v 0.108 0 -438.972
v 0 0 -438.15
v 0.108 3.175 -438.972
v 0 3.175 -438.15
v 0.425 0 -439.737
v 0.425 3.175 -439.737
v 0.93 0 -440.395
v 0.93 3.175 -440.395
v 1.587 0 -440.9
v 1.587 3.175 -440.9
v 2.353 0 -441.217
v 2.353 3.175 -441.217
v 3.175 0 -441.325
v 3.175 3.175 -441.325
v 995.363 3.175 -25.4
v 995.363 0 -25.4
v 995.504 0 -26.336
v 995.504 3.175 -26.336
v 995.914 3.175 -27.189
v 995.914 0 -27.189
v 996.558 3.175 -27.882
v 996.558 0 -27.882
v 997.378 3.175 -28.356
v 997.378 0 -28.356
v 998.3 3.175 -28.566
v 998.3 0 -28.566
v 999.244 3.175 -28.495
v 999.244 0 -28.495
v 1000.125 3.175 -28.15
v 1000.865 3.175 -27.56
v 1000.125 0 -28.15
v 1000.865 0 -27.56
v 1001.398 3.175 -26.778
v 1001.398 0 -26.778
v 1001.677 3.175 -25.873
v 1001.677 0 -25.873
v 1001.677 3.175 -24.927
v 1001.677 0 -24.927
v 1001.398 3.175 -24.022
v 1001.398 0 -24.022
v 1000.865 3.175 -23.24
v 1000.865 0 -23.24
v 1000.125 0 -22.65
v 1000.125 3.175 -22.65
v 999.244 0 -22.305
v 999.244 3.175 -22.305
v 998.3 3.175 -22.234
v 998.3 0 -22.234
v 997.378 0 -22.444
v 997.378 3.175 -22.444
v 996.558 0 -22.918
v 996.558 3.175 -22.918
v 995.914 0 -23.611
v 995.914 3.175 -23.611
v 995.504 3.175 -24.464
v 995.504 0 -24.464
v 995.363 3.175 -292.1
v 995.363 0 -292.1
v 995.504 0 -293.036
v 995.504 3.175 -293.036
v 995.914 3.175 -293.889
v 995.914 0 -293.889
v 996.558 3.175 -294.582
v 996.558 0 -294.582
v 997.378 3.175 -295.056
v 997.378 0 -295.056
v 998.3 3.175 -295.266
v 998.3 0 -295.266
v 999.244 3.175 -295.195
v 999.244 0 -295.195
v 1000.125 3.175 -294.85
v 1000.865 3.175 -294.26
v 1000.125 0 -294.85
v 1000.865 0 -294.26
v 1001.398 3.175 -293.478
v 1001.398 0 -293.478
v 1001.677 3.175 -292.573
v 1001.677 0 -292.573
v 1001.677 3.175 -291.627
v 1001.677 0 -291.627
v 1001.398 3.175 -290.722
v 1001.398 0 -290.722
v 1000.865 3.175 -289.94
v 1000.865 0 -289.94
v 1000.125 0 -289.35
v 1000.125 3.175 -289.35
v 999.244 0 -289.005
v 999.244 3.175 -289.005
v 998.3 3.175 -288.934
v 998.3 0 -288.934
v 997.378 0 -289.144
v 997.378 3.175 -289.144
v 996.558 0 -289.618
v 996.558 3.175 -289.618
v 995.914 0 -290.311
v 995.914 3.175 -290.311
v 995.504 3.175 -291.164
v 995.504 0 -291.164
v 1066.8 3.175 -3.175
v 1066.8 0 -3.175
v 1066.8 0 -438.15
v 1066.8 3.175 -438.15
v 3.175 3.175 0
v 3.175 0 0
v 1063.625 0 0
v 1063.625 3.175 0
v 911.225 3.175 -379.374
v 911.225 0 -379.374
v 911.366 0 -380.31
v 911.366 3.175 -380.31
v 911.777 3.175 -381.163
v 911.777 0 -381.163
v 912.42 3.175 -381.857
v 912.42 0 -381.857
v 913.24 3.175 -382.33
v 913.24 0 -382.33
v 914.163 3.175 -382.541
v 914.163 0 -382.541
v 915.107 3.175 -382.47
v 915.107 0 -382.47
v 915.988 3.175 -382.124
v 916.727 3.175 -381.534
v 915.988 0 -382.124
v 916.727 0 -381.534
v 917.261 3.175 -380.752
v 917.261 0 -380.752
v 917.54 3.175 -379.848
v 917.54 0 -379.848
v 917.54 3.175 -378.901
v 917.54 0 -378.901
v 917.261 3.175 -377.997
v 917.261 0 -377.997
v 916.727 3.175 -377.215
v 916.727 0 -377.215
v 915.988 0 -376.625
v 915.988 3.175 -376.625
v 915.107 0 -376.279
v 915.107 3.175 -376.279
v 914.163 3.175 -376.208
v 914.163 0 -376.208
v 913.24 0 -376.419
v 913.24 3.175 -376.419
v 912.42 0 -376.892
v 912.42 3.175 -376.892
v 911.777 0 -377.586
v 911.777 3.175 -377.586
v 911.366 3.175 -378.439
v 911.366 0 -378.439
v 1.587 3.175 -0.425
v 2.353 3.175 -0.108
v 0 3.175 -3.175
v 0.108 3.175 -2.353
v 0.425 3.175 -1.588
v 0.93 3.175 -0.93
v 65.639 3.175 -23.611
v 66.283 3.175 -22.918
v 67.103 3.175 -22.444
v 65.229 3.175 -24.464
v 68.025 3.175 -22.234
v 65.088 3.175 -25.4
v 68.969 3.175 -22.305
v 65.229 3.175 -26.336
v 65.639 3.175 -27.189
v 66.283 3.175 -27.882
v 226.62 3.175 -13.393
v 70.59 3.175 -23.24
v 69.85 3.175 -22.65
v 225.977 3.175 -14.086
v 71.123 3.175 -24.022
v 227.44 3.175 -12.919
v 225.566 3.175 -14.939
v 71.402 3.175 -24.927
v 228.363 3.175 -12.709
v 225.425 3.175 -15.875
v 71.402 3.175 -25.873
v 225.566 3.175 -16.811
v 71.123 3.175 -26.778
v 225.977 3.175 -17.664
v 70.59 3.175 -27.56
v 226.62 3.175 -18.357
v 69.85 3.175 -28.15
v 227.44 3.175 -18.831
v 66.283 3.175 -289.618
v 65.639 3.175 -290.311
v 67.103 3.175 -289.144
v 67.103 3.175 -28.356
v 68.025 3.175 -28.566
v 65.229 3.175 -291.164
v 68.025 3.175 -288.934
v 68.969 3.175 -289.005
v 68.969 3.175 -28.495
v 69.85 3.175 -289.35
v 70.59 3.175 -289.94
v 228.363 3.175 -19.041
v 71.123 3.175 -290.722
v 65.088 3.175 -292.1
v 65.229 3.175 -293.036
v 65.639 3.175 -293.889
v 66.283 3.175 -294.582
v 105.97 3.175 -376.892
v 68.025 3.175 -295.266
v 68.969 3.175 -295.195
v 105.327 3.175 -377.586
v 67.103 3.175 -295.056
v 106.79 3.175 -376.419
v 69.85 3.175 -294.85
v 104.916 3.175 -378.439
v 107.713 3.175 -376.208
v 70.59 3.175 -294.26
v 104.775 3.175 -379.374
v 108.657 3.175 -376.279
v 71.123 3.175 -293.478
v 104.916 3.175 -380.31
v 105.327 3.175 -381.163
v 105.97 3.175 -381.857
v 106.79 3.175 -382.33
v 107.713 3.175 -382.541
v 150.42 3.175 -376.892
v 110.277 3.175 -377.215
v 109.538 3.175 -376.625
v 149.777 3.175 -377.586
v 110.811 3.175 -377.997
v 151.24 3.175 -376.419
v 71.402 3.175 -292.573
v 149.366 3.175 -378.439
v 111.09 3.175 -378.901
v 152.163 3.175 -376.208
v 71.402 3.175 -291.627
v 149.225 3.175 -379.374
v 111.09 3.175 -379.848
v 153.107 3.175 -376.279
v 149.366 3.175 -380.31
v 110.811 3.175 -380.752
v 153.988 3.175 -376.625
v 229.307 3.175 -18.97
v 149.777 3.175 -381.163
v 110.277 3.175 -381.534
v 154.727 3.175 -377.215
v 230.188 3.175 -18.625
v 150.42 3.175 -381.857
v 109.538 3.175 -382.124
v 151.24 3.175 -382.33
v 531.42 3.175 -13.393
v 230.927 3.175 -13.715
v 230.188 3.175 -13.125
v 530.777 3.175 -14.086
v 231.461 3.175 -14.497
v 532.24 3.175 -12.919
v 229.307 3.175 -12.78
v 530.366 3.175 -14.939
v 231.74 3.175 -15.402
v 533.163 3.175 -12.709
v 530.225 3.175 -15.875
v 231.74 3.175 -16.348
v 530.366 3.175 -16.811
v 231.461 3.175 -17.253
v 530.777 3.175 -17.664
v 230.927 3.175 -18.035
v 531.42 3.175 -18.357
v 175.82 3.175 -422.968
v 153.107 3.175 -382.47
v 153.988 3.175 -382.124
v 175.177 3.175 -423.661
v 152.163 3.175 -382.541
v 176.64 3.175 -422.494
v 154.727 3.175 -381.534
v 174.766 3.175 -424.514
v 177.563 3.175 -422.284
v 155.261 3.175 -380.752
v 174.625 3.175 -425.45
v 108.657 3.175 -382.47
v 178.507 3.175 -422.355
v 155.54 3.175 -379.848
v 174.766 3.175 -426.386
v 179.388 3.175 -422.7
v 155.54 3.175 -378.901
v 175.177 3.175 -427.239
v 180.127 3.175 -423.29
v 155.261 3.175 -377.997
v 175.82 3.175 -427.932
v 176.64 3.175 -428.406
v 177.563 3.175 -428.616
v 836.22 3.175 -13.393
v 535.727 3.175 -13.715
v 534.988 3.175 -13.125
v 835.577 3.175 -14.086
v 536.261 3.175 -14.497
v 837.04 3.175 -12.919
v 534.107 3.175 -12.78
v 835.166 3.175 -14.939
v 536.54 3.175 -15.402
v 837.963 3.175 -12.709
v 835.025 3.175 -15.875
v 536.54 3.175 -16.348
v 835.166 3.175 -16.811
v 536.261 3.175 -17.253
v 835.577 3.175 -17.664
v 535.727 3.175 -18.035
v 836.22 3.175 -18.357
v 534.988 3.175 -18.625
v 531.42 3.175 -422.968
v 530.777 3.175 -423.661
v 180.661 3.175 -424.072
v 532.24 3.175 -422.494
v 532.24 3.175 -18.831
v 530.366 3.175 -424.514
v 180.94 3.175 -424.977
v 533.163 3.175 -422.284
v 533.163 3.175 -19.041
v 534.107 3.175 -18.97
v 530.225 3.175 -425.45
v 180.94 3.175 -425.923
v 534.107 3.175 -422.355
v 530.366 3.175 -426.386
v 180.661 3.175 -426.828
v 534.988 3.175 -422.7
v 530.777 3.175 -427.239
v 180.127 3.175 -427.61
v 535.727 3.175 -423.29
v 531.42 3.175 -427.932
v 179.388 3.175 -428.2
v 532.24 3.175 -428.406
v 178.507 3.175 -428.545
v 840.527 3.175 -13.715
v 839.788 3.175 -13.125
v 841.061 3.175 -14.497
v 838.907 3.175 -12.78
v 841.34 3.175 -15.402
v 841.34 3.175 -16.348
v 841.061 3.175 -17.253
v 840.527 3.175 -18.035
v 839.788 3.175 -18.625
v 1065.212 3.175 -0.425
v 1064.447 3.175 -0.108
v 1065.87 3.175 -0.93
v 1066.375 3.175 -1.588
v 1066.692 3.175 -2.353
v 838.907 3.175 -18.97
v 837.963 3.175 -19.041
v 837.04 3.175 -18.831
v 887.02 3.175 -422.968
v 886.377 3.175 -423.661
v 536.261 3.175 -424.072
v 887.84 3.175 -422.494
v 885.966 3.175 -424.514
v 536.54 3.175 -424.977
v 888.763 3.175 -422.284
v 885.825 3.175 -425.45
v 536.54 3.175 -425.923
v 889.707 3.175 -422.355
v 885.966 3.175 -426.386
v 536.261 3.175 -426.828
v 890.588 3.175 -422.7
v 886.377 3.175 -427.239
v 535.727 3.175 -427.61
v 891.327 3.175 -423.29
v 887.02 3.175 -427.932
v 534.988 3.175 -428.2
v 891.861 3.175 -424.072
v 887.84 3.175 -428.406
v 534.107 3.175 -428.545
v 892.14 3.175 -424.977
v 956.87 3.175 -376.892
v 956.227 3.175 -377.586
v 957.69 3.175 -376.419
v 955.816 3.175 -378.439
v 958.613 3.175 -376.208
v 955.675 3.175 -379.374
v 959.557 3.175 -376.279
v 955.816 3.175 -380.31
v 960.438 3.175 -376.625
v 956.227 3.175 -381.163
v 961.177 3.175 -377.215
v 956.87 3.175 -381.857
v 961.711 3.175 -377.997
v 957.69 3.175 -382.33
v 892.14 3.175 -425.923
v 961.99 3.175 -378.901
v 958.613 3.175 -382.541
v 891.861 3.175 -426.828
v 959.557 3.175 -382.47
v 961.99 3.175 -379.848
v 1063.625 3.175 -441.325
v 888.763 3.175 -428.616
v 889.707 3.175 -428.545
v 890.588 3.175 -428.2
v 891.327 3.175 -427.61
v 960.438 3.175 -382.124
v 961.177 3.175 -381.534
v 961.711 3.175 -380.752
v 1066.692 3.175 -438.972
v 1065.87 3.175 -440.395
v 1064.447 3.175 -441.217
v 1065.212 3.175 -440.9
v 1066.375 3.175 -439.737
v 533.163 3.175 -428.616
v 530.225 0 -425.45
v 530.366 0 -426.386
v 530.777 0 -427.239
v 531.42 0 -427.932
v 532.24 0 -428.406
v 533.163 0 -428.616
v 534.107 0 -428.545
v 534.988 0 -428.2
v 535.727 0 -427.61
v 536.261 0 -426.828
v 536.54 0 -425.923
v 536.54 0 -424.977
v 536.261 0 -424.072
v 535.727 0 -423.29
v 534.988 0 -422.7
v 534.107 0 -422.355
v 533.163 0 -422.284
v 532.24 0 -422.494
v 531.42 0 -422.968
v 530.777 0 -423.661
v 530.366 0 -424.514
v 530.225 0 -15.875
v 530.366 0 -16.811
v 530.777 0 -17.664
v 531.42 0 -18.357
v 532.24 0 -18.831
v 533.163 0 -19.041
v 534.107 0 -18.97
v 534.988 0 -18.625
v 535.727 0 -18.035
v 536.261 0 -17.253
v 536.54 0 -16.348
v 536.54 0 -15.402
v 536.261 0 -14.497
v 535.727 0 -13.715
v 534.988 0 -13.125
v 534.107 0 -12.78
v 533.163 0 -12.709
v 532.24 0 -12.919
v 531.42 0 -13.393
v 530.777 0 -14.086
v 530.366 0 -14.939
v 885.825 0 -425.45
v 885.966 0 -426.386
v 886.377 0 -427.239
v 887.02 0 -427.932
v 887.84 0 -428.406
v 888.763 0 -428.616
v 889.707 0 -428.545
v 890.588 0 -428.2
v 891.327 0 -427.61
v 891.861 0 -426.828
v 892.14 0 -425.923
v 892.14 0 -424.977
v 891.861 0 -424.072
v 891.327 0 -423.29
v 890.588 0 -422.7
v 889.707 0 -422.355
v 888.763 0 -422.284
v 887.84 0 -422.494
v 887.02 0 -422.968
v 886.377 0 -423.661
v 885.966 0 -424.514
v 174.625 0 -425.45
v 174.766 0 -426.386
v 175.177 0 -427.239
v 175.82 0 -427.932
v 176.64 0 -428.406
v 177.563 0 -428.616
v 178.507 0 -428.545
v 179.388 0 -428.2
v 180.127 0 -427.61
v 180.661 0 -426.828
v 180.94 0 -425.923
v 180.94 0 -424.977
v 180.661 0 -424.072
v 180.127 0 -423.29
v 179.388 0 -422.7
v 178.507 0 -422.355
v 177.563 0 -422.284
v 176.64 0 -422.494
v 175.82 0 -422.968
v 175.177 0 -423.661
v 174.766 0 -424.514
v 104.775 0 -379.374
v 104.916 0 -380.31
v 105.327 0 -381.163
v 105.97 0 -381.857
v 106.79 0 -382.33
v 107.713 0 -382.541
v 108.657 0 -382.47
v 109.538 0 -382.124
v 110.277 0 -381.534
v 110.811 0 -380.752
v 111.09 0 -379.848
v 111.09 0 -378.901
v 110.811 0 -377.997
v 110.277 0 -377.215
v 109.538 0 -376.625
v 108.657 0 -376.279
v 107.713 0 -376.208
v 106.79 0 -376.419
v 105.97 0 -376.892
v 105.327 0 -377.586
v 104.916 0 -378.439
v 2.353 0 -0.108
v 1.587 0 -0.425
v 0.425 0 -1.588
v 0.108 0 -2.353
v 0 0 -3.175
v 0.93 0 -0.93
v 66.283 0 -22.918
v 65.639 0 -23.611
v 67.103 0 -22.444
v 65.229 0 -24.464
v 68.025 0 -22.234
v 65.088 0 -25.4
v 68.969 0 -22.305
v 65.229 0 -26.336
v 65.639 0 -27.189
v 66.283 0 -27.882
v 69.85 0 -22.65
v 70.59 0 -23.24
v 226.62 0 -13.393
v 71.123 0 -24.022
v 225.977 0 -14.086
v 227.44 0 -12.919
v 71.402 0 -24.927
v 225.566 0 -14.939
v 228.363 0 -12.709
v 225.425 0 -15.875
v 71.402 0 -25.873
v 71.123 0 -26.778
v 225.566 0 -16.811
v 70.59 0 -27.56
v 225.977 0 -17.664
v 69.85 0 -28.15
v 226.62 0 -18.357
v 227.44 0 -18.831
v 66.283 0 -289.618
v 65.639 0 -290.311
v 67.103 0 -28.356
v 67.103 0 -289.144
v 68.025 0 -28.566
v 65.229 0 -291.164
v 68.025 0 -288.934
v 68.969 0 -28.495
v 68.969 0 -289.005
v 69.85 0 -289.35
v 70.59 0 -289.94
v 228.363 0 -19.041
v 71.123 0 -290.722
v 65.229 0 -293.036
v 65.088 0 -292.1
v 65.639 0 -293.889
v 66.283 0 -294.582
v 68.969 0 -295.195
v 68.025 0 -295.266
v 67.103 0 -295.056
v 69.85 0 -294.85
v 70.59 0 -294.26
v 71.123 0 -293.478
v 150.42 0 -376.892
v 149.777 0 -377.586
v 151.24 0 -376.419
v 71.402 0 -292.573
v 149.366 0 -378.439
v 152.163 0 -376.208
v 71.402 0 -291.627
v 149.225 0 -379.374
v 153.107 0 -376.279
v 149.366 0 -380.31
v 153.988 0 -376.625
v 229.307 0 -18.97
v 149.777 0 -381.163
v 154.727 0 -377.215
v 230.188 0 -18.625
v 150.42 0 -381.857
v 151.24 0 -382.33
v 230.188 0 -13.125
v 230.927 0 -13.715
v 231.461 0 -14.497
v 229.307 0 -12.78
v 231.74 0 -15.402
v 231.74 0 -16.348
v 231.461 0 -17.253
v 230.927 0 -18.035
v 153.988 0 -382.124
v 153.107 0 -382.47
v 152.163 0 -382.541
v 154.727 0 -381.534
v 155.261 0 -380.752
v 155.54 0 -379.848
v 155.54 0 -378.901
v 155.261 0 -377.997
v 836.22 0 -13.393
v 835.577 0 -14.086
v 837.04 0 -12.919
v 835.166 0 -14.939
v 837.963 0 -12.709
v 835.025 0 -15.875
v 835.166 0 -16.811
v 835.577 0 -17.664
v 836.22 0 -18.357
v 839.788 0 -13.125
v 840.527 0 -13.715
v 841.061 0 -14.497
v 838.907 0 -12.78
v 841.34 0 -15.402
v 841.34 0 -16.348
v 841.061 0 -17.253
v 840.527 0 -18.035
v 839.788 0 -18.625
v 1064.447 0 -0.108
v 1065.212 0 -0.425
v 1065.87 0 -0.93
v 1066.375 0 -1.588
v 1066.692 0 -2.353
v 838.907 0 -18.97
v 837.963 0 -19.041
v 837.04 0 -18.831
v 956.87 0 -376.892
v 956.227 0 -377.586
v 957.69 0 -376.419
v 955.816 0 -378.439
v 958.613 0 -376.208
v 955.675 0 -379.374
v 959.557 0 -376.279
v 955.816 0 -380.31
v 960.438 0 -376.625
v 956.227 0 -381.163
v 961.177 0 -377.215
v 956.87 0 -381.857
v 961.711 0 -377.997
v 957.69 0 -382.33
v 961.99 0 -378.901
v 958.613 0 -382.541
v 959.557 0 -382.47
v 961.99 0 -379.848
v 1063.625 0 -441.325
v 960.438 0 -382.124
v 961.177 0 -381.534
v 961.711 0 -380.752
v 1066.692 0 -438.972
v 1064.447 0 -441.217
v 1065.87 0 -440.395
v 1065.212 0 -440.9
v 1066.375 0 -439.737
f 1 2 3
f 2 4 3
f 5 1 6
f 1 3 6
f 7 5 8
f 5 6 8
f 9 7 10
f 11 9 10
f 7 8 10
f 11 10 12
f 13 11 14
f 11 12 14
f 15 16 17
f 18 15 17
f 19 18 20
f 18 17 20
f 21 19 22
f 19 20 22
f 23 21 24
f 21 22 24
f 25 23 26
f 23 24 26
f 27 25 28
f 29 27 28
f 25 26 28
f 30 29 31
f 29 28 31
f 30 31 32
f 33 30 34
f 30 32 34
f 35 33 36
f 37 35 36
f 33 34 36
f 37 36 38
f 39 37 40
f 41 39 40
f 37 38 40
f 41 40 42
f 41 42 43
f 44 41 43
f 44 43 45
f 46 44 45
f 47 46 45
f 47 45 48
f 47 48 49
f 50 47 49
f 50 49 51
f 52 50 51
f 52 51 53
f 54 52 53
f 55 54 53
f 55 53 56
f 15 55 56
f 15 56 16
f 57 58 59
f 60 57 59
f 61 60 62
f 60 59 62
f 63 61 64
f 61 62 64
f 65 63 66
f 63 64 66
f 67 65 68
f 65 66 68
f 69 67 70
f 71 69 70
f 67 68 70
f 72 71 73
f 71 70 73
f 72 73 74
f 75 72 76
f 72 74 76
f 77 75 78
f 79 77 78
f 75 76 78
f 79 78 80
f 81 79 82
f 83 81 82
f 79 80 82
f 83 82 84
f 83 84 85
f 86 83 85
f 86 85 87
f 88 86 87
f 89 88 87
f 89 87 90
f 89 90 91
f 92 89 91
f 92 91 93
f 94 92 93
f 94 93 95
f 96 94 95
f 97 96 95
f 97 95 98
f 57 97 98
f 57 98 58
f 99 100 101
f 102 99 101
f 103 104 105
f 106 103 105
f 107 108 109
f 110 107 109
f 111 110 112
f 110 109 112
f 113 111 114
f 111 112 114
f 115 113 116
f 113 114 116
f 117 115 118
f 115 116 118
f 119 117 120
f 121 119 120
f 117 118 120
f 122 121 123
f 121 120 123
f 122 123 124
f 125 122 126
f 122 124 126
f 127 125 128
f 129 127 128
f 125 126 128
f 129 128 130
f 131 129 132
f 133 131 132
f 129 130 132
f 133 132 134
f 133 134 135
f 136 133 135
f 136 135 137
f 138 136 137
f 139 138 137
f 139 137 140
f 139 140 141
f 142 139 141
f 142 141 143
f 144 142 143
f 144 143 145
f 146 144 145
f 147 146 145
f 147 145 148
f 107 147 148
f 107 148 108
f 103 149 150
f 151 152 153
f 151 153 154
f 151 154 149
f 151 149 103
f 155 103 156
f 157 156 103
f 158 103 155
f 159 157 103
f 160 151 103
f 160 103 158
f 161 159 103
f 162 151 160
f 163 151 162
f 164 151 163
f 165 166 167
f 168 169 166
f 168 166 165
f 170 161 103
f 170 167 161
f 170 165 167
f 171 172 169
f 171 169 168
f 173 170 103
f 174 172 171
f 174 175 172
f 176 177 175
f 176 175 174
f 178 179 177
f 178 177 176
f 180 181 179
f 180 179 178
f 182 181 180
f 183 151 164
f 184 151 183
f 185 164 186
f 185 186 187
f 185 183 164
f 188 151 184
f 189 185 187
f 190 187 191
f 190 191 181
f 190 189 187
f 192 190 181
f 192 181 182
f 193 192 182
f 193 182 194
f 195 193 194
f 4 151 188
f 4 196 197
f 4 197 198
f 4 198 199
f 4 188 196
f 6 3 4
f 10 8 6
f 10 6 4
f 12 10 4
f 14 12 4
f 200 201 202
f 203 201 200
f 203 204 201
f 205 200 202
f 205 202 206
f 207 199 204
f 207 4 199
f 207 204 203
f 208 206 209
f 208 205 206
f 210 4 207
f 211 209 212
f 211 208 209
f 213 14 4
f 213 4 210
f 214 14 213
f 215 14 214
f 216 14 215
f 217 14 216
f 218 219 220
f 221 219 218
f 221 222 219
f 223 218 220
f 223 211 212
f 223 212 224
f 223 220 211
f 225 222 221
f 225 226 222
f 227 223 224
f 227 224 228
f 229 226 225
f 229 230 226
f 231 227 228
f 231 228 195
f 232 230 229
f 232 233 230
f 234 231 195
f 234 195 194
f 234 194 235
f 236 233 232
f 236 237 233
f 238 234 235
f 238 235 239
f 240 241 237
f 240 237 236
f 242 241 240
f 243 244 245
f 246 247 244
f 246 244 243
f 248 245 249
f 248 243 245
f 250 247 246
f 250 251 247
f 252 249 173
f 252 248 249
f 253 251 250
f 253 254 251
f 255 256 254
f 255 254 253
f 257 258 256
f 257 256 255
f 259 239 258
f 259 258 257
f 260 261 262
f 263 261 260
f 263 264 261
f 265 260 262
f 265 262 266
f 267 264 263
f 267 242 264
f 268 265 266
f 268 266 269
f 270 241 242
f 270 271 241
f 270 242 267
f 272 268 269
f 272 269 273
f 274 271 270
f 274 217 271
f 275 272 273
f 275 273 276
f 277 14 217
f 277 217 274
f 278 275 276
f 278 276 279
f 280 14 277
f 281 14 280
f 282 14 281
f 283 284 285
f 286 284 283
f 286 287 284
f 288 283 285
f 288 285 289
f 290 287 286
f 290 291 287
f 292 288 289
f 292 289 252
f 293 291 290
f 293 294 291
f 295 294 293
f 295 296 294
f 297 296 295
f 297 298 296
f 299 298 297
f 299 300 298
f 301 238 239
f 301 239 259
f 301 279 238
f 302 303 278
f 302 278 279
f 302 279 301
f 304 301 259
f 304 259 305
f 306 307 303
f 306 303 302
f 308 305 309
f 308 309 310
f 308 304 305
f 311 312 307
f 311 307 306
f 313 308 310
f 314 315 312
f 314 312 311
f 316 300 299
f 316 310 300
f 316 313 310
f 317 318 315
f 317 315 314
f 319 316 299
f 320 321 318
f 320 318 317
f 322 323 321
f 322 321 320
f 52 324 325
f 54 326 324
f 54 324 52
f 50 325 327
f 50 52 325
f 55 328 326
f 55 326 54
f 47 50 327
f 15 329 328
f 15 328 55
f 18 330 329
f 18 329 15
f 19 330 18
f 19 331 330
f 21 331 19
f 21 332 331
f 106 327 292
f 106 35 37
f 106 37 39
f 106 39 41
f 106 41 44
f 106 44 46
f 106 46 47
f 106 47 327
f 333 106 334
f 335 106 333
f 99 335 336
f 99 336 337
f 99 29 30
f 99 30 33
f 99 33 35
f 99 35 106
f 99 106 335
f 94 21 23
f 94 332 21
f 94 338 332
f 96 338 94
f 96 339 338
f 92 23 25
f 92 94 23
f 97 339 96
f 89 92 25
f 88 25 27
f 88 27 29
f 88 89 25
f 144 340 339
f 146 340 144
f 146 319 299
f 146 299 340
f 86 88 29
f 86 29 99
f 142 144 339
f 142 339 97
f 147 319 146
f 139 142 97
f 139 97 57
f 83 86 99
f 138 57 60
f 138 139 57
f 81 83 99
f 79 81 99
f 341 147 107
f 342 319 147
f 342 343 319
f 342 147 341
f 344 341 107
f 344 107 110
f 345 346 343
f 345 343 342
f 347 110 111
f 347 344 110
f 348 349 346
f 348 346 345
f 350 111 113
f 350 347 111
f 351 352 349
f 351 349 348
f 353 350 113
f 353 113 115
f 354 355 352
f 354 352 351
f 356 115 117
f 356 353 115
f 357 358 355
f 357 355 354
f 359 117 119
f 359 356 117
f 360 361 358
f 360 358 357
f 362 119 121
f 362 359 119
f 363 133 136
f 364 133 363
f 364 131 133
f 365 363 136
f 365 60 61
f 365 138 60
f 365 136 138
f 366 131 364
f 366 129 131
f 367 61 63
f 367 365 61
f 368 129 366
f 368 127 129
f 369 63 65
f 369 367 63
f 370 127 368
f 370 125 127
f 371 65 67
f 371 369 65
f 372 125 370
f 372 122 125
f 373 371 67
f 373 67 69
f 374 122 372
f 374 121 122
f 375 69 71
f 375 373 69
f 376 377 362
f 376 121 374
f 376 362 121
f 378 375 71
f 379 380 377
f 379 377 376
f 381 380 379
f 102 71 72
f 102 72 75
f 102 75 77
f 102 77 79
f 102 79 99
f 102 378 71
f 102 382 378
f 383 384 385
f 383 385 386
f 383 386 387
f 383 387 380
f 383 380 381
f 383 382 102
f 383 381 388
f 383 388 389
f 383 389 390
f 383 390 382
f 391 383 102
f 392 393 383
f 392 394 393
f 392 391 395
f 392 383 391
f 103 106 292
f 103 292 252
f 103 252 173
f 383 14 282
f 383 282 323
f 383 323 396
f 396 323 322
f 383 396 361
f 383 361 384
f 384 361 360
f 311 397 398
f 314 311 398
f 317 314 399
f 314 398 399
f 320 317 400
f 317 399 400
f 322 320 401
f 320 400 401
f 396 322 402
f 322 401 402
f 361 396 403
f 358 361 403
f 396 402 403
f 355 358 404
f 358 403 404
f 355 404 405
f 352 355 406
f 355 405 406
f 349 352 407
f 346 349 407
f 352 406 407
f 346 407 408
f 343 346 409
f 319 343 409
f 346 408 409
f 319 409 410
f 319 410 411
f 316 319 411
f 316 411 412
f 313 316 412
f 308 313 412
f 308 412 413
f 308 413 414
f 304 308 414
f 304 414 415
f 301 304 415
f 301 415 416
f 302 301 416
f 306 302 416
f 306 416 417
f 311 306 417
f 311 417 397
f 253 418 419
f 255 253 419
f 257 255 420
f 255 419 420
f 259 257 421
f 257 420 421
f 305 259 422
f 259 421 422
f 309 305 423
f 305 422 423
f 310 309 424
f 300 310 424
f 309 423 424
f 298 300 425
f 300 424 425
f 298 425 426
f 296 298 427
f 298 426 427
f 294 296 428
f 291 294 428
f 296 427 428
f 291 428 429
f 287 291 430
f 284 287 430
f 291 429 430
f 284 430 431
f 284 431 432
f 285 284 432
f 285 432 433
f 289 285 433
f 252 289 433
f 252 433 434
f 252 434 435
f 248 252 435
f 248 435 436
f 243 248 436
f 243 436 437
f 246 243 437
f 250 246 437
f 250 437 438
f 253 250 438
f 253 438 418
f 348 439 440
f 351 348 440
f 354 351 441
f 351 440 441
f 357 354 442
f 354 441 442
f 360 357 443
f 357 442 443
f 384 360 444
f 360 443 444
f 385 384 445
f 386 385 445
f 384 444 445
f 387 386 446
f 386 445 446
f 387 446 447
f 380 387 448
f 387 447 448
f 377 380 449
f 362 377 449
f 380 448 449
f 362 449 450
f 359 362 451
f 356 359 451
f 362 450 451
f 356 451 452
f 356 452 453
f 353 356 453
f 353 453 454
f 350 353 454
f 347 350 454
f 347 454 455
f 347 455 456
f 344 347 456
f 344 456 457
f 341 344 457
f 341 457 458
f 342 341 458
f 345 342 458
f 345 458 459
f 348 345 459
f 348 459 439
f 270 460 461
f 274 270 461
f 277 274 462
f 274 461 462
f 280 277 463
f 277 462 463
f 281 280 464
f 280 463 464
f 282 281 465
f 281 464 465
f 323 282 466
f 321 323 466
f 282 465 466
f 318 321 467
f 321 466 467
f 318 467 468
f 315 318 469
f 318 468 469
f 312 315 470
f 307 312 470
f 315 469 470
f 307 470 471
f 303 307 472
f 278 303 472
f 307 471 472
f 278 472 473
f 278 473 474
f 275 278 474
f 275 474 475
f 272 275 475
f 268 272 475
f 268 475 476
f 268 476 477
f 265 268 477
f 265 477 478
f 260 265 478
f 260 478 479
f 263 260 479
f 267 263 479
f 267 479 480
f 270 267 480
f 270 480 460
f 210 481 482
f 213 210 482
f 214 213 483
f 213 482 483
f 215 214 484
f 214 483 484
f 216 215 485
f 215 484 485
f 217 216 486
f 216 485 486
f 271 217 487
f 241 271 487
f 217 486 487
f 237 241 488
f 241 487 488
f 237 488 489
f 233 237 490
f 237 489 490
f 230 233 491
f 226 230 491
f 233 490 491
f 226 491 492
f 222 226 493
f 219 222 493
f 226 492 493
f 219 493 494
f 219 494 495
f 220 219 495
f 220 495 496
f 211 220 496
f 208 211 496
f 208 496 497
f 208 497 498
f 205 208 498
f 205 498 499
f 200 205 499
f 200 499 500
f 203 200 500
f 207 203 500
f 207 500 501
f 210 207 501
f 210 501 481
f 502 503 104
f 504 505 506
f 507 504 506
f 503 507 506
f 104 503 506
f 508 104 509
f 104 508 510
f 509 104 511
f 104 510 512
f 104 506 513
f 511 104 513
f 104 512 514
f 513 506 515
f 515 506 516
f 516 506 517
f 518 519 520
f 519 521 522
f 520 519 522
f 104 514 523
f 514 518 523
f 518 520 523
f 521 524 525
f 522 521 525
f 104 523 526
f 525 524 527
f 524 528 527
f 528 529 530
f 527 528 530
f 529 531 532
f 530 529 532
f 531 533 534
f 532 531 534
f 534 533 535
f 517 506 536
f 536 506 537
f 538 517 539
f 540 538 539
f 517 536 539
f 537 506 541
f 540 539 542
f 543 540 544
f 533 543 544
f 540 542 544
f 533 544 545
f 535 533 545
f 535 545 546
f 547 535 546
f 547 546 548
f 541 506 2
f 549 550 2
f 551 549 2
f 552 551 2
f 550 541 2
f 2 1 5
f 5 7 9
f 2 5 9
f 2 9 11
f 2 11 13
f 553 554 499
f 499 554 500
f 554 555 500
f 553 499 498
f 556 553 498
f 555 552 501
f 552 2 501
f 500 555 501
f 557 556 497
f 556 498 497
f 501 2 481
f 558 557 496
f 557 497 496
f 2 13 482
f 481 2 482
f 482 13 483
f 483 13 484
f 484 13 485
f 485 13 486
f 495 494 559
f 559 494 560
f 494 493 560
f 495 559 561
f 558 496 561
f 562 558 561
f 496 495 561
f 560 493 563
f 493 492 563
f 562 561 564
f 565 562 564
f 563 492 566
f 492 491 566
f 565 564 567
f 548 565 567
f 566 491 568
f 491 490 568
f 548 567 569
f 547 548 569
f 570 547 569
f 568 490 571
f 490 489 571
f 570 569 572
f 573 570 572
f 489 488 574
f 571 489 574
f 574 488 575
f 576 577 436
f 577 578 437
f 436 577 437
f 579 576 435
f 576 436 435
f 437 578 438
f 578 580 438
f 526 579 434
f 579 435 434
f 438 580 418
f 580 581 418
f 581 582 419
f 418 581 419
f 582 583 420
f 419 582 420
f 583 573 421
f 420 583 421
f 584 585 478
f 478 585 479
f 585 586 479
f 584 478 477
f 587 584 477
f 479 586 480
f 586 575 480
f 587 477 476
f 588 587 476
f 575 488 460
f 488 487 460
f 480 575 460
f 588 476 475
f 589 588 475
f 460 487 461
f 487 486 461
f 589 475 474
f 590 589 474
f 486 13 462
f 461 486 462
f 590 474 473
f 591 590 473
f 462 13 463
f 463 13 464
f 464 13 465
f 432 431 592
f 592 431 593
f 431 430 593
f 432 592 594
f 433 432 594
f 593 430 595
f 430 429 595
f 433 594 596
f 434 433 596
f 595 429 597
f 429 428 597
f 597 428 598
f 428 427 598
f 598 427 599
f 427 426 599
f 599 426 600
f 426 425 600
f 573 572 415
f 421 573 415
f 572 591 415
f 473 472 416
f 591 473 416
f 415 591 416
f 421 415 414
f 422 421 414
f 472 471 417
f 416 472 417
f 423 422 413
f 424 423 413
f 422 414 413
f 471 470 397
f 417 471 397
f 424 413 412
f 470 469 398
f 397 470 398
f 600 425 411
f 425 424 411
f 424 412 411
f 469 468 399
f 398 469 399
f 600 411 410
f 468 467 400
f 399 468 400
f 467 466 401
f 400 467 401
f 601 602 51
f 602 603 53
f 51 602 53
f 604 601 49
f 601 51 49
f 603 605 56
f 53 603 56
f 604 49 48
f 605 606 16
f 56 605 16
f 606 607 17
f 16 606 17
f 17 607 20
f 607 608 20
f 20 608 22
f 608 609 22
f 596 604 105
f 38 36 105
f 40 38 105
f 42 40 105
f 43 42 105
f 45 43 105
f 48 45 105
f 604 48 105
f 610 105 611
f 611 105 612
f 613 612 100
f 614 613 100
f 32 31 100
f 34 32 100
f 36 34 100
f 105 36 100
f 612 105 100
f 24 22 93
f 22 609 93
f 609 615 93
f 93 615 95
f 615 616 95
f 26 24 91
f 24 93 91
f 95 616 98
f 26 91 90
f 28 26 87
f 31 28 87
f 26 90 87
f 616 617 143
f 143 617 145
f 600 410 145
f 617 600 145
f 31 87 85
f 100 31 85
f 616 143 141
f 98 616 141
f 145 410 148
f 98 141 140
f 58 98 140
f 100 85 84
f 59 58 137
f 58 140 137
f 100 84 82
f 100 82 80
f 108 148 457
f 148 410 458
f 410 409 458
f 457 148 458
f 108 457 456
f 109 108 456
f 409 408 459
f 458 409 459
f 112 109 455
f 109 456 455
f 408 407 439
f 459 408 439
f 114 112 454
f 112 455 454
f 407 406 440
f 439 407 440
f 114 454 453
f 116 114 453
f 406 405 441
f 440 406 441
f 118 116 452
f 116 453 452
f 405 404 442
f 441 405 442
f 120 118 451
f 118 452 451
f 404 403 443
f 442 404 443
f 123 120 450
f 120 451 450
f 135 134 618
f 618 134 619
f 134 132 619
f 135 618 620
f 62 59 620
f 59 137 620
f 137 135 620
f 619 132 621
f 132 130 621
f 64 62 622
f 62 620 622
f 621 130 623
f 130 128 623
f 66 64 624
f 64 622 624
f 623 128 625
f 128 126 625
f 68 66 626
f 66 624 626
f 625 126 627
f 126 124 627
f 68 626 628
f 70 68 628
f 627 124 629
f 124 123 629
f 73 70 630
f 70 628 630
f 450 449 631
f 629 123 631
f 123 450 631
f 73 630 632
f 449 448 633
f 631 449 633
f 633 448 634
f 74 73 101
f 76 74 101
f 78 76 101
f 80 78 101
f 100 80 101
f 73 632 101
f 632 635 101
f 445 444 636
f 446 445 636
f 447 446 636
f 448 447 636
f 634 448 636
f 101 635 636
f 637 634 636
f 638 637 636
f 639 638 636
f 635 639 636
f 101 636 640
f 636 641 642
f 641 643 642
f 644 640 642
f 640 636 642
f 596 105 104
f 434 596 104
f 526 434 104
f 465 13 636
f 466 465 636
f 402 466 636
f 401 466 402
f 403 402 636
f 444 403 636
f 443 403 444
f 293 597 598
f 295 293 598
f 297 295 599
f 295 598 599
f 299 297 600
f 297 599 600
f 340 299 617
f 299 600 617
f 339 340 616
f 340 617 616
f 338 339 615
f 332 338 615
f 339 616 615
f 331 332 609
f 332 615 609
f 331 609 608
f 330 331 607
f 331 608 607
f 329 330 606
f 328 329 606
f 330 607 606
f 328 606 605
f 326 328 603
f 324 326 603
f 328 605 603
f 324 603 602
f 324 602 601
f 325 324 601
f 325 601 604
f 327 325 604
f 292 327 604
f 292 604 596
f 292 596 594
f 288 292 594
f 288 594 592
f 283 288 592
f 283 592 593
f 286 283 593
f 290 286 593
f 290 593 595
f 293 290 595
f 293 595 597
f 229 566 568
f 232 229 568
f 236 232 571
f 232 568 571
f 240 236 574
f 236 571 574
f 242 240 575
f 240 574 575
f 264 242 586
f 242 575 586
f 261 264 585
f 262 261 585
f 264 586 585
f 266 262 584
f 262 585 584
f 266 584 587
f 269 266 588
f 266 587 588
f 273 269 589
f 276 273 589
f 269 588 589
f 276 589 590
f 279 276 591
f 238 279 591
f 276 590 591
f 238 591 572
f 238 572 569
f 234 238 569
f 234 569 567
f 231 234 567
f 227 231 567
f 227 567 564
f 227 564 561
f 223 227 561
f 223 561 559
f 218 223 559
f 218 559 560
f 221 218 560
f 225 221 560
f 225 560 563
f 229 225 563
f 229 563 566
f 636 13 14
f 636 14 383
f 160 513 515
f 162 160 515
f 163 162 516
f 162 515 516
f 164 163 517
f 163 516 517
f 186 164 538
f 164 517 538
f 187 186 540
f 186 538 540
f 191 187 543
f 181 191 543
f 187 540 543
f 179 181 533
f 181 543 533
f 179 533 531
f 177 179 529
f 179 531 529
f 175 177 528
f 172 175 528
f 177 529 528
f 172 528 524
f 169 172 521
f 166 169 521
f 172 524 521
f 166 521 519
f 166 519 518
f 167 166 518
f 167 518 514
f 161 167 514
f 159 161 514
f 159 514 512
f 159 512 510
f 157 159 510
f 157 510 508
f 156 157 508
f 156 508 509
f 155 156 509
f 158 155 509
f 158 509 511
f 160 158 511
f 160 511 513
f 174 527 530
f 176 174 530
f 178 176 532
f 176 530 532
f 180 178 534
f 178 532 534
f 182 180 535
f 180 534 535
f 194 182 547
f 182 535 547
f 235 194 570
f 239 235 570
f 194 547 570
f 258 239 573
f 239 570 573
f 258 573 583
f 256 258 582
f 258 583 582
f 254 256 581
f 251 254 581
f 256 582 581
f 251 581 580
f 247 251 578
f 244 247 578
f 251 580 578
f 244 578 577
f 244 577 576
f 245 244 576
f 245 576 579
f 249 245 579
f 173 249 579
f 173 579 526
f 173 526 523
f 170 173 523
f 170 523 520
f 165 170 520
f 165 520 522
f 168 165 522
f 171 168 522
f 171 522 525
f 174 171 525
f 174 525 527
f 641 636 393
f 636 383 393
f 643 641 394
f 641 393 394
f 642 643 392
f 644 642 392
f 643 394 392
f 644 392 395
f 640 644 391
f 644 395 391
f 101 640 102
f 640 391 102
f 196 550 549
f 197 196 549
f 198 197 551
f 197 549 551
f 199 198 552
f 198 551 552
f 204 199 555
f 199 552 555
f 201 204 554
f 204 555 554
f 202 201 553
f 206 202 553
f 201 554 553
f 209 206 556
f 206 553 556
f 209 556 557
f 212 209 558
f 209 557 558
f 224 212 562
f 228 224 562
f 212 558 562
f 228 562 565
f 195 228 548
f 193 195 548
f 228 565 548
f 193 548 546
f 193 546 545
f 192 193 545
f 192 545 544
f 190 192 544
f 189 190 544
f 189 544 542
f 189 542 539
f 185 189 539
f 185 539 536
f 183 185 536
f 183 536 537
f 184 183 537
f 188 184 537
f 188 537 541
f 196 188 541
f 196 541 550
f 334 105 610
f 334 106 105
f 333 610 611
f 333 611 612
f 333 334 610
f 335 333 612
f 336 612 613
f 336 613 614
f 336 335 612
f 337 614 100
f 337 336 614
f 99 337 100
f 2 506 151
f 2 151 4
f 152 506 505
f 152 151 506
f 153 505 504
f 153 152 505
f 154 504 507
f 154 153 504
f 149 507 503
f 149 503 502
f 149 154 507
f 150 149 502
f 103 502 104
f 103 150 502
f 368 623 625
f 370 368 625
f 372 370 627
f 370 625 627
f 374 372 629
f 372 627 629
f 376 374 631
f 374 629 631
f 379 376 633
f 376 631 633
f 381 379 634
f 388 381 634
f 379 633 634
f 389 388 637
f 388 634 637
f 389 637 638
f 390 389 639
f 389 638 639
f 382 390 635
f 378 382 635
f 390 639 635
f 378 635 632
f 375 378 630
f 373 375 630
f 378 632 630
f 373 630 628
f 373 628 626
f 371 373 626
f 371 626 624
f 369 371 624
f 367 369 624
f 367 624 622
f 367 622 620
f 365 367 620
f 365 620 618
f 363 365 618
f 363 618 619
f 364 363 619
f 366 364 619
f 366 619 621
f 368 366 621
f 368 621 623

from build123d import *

# Parameters (mm, degrees)
SKETCH1_W                   = 1066.8
SKETCH1_H                   = 441.325
BOSS_EXTRUDE1_DEPTH         = 3.175
F_1_4_0_25_DIAMETER_HOLE1_D = 6.35
FILLET2_R                   = 3.175


with BuildPart() as part:
    # Sketch1 → Boss-Extrude1 (new body)
    with BuildSketch(Plane(origin=(0, 0, 0), x_dir=(1, 0, 0), z_dir=(0, 1, 0))):
        with Locations((533.4, 220.6625)):
            Rectangle(SKETCH1_W, SKETCH1_H)
    extrude(amount=BOSS_EXTRUDE1_DEPTH)

    # 1/4 (0.25) Diameter Hole1 (through all)
    with Locations(Plane(origin=(0, 3.175, 0), x_dir=(1, 0, 0), z_dir=(0, 1, 0))):
        with Locations((228.6, 15.875), (533.4, 15.875), (838.2, 15.875), (889, 425.45), (533.4, 425.45), (177.8, 425.45), (68.2625, 25.4), (68.2625, 292.1), (998.5375, 25.4), (998.5375, 292.1), (958.85, 379.3744), (914.4, 379.3744), (107.95, 379.3744), (152.4, 379.3744)):
            Hole(F_1_4_0_25_DIAMETER_HOLE1_D / 2)

    # Fillet2
    fillet2_edges = [part.edges().sort_by_distance(p)[0] for p in [
        (0, 1.5875, -441.325),
        (1066.8, 1.5875, -441.325),
        (1066.8, 1.5875, 0),
        (0, 1.5875, 0),
    ]]
    fillet(fillet2_edges, radius=FILLET2_R)


solid = part.part
